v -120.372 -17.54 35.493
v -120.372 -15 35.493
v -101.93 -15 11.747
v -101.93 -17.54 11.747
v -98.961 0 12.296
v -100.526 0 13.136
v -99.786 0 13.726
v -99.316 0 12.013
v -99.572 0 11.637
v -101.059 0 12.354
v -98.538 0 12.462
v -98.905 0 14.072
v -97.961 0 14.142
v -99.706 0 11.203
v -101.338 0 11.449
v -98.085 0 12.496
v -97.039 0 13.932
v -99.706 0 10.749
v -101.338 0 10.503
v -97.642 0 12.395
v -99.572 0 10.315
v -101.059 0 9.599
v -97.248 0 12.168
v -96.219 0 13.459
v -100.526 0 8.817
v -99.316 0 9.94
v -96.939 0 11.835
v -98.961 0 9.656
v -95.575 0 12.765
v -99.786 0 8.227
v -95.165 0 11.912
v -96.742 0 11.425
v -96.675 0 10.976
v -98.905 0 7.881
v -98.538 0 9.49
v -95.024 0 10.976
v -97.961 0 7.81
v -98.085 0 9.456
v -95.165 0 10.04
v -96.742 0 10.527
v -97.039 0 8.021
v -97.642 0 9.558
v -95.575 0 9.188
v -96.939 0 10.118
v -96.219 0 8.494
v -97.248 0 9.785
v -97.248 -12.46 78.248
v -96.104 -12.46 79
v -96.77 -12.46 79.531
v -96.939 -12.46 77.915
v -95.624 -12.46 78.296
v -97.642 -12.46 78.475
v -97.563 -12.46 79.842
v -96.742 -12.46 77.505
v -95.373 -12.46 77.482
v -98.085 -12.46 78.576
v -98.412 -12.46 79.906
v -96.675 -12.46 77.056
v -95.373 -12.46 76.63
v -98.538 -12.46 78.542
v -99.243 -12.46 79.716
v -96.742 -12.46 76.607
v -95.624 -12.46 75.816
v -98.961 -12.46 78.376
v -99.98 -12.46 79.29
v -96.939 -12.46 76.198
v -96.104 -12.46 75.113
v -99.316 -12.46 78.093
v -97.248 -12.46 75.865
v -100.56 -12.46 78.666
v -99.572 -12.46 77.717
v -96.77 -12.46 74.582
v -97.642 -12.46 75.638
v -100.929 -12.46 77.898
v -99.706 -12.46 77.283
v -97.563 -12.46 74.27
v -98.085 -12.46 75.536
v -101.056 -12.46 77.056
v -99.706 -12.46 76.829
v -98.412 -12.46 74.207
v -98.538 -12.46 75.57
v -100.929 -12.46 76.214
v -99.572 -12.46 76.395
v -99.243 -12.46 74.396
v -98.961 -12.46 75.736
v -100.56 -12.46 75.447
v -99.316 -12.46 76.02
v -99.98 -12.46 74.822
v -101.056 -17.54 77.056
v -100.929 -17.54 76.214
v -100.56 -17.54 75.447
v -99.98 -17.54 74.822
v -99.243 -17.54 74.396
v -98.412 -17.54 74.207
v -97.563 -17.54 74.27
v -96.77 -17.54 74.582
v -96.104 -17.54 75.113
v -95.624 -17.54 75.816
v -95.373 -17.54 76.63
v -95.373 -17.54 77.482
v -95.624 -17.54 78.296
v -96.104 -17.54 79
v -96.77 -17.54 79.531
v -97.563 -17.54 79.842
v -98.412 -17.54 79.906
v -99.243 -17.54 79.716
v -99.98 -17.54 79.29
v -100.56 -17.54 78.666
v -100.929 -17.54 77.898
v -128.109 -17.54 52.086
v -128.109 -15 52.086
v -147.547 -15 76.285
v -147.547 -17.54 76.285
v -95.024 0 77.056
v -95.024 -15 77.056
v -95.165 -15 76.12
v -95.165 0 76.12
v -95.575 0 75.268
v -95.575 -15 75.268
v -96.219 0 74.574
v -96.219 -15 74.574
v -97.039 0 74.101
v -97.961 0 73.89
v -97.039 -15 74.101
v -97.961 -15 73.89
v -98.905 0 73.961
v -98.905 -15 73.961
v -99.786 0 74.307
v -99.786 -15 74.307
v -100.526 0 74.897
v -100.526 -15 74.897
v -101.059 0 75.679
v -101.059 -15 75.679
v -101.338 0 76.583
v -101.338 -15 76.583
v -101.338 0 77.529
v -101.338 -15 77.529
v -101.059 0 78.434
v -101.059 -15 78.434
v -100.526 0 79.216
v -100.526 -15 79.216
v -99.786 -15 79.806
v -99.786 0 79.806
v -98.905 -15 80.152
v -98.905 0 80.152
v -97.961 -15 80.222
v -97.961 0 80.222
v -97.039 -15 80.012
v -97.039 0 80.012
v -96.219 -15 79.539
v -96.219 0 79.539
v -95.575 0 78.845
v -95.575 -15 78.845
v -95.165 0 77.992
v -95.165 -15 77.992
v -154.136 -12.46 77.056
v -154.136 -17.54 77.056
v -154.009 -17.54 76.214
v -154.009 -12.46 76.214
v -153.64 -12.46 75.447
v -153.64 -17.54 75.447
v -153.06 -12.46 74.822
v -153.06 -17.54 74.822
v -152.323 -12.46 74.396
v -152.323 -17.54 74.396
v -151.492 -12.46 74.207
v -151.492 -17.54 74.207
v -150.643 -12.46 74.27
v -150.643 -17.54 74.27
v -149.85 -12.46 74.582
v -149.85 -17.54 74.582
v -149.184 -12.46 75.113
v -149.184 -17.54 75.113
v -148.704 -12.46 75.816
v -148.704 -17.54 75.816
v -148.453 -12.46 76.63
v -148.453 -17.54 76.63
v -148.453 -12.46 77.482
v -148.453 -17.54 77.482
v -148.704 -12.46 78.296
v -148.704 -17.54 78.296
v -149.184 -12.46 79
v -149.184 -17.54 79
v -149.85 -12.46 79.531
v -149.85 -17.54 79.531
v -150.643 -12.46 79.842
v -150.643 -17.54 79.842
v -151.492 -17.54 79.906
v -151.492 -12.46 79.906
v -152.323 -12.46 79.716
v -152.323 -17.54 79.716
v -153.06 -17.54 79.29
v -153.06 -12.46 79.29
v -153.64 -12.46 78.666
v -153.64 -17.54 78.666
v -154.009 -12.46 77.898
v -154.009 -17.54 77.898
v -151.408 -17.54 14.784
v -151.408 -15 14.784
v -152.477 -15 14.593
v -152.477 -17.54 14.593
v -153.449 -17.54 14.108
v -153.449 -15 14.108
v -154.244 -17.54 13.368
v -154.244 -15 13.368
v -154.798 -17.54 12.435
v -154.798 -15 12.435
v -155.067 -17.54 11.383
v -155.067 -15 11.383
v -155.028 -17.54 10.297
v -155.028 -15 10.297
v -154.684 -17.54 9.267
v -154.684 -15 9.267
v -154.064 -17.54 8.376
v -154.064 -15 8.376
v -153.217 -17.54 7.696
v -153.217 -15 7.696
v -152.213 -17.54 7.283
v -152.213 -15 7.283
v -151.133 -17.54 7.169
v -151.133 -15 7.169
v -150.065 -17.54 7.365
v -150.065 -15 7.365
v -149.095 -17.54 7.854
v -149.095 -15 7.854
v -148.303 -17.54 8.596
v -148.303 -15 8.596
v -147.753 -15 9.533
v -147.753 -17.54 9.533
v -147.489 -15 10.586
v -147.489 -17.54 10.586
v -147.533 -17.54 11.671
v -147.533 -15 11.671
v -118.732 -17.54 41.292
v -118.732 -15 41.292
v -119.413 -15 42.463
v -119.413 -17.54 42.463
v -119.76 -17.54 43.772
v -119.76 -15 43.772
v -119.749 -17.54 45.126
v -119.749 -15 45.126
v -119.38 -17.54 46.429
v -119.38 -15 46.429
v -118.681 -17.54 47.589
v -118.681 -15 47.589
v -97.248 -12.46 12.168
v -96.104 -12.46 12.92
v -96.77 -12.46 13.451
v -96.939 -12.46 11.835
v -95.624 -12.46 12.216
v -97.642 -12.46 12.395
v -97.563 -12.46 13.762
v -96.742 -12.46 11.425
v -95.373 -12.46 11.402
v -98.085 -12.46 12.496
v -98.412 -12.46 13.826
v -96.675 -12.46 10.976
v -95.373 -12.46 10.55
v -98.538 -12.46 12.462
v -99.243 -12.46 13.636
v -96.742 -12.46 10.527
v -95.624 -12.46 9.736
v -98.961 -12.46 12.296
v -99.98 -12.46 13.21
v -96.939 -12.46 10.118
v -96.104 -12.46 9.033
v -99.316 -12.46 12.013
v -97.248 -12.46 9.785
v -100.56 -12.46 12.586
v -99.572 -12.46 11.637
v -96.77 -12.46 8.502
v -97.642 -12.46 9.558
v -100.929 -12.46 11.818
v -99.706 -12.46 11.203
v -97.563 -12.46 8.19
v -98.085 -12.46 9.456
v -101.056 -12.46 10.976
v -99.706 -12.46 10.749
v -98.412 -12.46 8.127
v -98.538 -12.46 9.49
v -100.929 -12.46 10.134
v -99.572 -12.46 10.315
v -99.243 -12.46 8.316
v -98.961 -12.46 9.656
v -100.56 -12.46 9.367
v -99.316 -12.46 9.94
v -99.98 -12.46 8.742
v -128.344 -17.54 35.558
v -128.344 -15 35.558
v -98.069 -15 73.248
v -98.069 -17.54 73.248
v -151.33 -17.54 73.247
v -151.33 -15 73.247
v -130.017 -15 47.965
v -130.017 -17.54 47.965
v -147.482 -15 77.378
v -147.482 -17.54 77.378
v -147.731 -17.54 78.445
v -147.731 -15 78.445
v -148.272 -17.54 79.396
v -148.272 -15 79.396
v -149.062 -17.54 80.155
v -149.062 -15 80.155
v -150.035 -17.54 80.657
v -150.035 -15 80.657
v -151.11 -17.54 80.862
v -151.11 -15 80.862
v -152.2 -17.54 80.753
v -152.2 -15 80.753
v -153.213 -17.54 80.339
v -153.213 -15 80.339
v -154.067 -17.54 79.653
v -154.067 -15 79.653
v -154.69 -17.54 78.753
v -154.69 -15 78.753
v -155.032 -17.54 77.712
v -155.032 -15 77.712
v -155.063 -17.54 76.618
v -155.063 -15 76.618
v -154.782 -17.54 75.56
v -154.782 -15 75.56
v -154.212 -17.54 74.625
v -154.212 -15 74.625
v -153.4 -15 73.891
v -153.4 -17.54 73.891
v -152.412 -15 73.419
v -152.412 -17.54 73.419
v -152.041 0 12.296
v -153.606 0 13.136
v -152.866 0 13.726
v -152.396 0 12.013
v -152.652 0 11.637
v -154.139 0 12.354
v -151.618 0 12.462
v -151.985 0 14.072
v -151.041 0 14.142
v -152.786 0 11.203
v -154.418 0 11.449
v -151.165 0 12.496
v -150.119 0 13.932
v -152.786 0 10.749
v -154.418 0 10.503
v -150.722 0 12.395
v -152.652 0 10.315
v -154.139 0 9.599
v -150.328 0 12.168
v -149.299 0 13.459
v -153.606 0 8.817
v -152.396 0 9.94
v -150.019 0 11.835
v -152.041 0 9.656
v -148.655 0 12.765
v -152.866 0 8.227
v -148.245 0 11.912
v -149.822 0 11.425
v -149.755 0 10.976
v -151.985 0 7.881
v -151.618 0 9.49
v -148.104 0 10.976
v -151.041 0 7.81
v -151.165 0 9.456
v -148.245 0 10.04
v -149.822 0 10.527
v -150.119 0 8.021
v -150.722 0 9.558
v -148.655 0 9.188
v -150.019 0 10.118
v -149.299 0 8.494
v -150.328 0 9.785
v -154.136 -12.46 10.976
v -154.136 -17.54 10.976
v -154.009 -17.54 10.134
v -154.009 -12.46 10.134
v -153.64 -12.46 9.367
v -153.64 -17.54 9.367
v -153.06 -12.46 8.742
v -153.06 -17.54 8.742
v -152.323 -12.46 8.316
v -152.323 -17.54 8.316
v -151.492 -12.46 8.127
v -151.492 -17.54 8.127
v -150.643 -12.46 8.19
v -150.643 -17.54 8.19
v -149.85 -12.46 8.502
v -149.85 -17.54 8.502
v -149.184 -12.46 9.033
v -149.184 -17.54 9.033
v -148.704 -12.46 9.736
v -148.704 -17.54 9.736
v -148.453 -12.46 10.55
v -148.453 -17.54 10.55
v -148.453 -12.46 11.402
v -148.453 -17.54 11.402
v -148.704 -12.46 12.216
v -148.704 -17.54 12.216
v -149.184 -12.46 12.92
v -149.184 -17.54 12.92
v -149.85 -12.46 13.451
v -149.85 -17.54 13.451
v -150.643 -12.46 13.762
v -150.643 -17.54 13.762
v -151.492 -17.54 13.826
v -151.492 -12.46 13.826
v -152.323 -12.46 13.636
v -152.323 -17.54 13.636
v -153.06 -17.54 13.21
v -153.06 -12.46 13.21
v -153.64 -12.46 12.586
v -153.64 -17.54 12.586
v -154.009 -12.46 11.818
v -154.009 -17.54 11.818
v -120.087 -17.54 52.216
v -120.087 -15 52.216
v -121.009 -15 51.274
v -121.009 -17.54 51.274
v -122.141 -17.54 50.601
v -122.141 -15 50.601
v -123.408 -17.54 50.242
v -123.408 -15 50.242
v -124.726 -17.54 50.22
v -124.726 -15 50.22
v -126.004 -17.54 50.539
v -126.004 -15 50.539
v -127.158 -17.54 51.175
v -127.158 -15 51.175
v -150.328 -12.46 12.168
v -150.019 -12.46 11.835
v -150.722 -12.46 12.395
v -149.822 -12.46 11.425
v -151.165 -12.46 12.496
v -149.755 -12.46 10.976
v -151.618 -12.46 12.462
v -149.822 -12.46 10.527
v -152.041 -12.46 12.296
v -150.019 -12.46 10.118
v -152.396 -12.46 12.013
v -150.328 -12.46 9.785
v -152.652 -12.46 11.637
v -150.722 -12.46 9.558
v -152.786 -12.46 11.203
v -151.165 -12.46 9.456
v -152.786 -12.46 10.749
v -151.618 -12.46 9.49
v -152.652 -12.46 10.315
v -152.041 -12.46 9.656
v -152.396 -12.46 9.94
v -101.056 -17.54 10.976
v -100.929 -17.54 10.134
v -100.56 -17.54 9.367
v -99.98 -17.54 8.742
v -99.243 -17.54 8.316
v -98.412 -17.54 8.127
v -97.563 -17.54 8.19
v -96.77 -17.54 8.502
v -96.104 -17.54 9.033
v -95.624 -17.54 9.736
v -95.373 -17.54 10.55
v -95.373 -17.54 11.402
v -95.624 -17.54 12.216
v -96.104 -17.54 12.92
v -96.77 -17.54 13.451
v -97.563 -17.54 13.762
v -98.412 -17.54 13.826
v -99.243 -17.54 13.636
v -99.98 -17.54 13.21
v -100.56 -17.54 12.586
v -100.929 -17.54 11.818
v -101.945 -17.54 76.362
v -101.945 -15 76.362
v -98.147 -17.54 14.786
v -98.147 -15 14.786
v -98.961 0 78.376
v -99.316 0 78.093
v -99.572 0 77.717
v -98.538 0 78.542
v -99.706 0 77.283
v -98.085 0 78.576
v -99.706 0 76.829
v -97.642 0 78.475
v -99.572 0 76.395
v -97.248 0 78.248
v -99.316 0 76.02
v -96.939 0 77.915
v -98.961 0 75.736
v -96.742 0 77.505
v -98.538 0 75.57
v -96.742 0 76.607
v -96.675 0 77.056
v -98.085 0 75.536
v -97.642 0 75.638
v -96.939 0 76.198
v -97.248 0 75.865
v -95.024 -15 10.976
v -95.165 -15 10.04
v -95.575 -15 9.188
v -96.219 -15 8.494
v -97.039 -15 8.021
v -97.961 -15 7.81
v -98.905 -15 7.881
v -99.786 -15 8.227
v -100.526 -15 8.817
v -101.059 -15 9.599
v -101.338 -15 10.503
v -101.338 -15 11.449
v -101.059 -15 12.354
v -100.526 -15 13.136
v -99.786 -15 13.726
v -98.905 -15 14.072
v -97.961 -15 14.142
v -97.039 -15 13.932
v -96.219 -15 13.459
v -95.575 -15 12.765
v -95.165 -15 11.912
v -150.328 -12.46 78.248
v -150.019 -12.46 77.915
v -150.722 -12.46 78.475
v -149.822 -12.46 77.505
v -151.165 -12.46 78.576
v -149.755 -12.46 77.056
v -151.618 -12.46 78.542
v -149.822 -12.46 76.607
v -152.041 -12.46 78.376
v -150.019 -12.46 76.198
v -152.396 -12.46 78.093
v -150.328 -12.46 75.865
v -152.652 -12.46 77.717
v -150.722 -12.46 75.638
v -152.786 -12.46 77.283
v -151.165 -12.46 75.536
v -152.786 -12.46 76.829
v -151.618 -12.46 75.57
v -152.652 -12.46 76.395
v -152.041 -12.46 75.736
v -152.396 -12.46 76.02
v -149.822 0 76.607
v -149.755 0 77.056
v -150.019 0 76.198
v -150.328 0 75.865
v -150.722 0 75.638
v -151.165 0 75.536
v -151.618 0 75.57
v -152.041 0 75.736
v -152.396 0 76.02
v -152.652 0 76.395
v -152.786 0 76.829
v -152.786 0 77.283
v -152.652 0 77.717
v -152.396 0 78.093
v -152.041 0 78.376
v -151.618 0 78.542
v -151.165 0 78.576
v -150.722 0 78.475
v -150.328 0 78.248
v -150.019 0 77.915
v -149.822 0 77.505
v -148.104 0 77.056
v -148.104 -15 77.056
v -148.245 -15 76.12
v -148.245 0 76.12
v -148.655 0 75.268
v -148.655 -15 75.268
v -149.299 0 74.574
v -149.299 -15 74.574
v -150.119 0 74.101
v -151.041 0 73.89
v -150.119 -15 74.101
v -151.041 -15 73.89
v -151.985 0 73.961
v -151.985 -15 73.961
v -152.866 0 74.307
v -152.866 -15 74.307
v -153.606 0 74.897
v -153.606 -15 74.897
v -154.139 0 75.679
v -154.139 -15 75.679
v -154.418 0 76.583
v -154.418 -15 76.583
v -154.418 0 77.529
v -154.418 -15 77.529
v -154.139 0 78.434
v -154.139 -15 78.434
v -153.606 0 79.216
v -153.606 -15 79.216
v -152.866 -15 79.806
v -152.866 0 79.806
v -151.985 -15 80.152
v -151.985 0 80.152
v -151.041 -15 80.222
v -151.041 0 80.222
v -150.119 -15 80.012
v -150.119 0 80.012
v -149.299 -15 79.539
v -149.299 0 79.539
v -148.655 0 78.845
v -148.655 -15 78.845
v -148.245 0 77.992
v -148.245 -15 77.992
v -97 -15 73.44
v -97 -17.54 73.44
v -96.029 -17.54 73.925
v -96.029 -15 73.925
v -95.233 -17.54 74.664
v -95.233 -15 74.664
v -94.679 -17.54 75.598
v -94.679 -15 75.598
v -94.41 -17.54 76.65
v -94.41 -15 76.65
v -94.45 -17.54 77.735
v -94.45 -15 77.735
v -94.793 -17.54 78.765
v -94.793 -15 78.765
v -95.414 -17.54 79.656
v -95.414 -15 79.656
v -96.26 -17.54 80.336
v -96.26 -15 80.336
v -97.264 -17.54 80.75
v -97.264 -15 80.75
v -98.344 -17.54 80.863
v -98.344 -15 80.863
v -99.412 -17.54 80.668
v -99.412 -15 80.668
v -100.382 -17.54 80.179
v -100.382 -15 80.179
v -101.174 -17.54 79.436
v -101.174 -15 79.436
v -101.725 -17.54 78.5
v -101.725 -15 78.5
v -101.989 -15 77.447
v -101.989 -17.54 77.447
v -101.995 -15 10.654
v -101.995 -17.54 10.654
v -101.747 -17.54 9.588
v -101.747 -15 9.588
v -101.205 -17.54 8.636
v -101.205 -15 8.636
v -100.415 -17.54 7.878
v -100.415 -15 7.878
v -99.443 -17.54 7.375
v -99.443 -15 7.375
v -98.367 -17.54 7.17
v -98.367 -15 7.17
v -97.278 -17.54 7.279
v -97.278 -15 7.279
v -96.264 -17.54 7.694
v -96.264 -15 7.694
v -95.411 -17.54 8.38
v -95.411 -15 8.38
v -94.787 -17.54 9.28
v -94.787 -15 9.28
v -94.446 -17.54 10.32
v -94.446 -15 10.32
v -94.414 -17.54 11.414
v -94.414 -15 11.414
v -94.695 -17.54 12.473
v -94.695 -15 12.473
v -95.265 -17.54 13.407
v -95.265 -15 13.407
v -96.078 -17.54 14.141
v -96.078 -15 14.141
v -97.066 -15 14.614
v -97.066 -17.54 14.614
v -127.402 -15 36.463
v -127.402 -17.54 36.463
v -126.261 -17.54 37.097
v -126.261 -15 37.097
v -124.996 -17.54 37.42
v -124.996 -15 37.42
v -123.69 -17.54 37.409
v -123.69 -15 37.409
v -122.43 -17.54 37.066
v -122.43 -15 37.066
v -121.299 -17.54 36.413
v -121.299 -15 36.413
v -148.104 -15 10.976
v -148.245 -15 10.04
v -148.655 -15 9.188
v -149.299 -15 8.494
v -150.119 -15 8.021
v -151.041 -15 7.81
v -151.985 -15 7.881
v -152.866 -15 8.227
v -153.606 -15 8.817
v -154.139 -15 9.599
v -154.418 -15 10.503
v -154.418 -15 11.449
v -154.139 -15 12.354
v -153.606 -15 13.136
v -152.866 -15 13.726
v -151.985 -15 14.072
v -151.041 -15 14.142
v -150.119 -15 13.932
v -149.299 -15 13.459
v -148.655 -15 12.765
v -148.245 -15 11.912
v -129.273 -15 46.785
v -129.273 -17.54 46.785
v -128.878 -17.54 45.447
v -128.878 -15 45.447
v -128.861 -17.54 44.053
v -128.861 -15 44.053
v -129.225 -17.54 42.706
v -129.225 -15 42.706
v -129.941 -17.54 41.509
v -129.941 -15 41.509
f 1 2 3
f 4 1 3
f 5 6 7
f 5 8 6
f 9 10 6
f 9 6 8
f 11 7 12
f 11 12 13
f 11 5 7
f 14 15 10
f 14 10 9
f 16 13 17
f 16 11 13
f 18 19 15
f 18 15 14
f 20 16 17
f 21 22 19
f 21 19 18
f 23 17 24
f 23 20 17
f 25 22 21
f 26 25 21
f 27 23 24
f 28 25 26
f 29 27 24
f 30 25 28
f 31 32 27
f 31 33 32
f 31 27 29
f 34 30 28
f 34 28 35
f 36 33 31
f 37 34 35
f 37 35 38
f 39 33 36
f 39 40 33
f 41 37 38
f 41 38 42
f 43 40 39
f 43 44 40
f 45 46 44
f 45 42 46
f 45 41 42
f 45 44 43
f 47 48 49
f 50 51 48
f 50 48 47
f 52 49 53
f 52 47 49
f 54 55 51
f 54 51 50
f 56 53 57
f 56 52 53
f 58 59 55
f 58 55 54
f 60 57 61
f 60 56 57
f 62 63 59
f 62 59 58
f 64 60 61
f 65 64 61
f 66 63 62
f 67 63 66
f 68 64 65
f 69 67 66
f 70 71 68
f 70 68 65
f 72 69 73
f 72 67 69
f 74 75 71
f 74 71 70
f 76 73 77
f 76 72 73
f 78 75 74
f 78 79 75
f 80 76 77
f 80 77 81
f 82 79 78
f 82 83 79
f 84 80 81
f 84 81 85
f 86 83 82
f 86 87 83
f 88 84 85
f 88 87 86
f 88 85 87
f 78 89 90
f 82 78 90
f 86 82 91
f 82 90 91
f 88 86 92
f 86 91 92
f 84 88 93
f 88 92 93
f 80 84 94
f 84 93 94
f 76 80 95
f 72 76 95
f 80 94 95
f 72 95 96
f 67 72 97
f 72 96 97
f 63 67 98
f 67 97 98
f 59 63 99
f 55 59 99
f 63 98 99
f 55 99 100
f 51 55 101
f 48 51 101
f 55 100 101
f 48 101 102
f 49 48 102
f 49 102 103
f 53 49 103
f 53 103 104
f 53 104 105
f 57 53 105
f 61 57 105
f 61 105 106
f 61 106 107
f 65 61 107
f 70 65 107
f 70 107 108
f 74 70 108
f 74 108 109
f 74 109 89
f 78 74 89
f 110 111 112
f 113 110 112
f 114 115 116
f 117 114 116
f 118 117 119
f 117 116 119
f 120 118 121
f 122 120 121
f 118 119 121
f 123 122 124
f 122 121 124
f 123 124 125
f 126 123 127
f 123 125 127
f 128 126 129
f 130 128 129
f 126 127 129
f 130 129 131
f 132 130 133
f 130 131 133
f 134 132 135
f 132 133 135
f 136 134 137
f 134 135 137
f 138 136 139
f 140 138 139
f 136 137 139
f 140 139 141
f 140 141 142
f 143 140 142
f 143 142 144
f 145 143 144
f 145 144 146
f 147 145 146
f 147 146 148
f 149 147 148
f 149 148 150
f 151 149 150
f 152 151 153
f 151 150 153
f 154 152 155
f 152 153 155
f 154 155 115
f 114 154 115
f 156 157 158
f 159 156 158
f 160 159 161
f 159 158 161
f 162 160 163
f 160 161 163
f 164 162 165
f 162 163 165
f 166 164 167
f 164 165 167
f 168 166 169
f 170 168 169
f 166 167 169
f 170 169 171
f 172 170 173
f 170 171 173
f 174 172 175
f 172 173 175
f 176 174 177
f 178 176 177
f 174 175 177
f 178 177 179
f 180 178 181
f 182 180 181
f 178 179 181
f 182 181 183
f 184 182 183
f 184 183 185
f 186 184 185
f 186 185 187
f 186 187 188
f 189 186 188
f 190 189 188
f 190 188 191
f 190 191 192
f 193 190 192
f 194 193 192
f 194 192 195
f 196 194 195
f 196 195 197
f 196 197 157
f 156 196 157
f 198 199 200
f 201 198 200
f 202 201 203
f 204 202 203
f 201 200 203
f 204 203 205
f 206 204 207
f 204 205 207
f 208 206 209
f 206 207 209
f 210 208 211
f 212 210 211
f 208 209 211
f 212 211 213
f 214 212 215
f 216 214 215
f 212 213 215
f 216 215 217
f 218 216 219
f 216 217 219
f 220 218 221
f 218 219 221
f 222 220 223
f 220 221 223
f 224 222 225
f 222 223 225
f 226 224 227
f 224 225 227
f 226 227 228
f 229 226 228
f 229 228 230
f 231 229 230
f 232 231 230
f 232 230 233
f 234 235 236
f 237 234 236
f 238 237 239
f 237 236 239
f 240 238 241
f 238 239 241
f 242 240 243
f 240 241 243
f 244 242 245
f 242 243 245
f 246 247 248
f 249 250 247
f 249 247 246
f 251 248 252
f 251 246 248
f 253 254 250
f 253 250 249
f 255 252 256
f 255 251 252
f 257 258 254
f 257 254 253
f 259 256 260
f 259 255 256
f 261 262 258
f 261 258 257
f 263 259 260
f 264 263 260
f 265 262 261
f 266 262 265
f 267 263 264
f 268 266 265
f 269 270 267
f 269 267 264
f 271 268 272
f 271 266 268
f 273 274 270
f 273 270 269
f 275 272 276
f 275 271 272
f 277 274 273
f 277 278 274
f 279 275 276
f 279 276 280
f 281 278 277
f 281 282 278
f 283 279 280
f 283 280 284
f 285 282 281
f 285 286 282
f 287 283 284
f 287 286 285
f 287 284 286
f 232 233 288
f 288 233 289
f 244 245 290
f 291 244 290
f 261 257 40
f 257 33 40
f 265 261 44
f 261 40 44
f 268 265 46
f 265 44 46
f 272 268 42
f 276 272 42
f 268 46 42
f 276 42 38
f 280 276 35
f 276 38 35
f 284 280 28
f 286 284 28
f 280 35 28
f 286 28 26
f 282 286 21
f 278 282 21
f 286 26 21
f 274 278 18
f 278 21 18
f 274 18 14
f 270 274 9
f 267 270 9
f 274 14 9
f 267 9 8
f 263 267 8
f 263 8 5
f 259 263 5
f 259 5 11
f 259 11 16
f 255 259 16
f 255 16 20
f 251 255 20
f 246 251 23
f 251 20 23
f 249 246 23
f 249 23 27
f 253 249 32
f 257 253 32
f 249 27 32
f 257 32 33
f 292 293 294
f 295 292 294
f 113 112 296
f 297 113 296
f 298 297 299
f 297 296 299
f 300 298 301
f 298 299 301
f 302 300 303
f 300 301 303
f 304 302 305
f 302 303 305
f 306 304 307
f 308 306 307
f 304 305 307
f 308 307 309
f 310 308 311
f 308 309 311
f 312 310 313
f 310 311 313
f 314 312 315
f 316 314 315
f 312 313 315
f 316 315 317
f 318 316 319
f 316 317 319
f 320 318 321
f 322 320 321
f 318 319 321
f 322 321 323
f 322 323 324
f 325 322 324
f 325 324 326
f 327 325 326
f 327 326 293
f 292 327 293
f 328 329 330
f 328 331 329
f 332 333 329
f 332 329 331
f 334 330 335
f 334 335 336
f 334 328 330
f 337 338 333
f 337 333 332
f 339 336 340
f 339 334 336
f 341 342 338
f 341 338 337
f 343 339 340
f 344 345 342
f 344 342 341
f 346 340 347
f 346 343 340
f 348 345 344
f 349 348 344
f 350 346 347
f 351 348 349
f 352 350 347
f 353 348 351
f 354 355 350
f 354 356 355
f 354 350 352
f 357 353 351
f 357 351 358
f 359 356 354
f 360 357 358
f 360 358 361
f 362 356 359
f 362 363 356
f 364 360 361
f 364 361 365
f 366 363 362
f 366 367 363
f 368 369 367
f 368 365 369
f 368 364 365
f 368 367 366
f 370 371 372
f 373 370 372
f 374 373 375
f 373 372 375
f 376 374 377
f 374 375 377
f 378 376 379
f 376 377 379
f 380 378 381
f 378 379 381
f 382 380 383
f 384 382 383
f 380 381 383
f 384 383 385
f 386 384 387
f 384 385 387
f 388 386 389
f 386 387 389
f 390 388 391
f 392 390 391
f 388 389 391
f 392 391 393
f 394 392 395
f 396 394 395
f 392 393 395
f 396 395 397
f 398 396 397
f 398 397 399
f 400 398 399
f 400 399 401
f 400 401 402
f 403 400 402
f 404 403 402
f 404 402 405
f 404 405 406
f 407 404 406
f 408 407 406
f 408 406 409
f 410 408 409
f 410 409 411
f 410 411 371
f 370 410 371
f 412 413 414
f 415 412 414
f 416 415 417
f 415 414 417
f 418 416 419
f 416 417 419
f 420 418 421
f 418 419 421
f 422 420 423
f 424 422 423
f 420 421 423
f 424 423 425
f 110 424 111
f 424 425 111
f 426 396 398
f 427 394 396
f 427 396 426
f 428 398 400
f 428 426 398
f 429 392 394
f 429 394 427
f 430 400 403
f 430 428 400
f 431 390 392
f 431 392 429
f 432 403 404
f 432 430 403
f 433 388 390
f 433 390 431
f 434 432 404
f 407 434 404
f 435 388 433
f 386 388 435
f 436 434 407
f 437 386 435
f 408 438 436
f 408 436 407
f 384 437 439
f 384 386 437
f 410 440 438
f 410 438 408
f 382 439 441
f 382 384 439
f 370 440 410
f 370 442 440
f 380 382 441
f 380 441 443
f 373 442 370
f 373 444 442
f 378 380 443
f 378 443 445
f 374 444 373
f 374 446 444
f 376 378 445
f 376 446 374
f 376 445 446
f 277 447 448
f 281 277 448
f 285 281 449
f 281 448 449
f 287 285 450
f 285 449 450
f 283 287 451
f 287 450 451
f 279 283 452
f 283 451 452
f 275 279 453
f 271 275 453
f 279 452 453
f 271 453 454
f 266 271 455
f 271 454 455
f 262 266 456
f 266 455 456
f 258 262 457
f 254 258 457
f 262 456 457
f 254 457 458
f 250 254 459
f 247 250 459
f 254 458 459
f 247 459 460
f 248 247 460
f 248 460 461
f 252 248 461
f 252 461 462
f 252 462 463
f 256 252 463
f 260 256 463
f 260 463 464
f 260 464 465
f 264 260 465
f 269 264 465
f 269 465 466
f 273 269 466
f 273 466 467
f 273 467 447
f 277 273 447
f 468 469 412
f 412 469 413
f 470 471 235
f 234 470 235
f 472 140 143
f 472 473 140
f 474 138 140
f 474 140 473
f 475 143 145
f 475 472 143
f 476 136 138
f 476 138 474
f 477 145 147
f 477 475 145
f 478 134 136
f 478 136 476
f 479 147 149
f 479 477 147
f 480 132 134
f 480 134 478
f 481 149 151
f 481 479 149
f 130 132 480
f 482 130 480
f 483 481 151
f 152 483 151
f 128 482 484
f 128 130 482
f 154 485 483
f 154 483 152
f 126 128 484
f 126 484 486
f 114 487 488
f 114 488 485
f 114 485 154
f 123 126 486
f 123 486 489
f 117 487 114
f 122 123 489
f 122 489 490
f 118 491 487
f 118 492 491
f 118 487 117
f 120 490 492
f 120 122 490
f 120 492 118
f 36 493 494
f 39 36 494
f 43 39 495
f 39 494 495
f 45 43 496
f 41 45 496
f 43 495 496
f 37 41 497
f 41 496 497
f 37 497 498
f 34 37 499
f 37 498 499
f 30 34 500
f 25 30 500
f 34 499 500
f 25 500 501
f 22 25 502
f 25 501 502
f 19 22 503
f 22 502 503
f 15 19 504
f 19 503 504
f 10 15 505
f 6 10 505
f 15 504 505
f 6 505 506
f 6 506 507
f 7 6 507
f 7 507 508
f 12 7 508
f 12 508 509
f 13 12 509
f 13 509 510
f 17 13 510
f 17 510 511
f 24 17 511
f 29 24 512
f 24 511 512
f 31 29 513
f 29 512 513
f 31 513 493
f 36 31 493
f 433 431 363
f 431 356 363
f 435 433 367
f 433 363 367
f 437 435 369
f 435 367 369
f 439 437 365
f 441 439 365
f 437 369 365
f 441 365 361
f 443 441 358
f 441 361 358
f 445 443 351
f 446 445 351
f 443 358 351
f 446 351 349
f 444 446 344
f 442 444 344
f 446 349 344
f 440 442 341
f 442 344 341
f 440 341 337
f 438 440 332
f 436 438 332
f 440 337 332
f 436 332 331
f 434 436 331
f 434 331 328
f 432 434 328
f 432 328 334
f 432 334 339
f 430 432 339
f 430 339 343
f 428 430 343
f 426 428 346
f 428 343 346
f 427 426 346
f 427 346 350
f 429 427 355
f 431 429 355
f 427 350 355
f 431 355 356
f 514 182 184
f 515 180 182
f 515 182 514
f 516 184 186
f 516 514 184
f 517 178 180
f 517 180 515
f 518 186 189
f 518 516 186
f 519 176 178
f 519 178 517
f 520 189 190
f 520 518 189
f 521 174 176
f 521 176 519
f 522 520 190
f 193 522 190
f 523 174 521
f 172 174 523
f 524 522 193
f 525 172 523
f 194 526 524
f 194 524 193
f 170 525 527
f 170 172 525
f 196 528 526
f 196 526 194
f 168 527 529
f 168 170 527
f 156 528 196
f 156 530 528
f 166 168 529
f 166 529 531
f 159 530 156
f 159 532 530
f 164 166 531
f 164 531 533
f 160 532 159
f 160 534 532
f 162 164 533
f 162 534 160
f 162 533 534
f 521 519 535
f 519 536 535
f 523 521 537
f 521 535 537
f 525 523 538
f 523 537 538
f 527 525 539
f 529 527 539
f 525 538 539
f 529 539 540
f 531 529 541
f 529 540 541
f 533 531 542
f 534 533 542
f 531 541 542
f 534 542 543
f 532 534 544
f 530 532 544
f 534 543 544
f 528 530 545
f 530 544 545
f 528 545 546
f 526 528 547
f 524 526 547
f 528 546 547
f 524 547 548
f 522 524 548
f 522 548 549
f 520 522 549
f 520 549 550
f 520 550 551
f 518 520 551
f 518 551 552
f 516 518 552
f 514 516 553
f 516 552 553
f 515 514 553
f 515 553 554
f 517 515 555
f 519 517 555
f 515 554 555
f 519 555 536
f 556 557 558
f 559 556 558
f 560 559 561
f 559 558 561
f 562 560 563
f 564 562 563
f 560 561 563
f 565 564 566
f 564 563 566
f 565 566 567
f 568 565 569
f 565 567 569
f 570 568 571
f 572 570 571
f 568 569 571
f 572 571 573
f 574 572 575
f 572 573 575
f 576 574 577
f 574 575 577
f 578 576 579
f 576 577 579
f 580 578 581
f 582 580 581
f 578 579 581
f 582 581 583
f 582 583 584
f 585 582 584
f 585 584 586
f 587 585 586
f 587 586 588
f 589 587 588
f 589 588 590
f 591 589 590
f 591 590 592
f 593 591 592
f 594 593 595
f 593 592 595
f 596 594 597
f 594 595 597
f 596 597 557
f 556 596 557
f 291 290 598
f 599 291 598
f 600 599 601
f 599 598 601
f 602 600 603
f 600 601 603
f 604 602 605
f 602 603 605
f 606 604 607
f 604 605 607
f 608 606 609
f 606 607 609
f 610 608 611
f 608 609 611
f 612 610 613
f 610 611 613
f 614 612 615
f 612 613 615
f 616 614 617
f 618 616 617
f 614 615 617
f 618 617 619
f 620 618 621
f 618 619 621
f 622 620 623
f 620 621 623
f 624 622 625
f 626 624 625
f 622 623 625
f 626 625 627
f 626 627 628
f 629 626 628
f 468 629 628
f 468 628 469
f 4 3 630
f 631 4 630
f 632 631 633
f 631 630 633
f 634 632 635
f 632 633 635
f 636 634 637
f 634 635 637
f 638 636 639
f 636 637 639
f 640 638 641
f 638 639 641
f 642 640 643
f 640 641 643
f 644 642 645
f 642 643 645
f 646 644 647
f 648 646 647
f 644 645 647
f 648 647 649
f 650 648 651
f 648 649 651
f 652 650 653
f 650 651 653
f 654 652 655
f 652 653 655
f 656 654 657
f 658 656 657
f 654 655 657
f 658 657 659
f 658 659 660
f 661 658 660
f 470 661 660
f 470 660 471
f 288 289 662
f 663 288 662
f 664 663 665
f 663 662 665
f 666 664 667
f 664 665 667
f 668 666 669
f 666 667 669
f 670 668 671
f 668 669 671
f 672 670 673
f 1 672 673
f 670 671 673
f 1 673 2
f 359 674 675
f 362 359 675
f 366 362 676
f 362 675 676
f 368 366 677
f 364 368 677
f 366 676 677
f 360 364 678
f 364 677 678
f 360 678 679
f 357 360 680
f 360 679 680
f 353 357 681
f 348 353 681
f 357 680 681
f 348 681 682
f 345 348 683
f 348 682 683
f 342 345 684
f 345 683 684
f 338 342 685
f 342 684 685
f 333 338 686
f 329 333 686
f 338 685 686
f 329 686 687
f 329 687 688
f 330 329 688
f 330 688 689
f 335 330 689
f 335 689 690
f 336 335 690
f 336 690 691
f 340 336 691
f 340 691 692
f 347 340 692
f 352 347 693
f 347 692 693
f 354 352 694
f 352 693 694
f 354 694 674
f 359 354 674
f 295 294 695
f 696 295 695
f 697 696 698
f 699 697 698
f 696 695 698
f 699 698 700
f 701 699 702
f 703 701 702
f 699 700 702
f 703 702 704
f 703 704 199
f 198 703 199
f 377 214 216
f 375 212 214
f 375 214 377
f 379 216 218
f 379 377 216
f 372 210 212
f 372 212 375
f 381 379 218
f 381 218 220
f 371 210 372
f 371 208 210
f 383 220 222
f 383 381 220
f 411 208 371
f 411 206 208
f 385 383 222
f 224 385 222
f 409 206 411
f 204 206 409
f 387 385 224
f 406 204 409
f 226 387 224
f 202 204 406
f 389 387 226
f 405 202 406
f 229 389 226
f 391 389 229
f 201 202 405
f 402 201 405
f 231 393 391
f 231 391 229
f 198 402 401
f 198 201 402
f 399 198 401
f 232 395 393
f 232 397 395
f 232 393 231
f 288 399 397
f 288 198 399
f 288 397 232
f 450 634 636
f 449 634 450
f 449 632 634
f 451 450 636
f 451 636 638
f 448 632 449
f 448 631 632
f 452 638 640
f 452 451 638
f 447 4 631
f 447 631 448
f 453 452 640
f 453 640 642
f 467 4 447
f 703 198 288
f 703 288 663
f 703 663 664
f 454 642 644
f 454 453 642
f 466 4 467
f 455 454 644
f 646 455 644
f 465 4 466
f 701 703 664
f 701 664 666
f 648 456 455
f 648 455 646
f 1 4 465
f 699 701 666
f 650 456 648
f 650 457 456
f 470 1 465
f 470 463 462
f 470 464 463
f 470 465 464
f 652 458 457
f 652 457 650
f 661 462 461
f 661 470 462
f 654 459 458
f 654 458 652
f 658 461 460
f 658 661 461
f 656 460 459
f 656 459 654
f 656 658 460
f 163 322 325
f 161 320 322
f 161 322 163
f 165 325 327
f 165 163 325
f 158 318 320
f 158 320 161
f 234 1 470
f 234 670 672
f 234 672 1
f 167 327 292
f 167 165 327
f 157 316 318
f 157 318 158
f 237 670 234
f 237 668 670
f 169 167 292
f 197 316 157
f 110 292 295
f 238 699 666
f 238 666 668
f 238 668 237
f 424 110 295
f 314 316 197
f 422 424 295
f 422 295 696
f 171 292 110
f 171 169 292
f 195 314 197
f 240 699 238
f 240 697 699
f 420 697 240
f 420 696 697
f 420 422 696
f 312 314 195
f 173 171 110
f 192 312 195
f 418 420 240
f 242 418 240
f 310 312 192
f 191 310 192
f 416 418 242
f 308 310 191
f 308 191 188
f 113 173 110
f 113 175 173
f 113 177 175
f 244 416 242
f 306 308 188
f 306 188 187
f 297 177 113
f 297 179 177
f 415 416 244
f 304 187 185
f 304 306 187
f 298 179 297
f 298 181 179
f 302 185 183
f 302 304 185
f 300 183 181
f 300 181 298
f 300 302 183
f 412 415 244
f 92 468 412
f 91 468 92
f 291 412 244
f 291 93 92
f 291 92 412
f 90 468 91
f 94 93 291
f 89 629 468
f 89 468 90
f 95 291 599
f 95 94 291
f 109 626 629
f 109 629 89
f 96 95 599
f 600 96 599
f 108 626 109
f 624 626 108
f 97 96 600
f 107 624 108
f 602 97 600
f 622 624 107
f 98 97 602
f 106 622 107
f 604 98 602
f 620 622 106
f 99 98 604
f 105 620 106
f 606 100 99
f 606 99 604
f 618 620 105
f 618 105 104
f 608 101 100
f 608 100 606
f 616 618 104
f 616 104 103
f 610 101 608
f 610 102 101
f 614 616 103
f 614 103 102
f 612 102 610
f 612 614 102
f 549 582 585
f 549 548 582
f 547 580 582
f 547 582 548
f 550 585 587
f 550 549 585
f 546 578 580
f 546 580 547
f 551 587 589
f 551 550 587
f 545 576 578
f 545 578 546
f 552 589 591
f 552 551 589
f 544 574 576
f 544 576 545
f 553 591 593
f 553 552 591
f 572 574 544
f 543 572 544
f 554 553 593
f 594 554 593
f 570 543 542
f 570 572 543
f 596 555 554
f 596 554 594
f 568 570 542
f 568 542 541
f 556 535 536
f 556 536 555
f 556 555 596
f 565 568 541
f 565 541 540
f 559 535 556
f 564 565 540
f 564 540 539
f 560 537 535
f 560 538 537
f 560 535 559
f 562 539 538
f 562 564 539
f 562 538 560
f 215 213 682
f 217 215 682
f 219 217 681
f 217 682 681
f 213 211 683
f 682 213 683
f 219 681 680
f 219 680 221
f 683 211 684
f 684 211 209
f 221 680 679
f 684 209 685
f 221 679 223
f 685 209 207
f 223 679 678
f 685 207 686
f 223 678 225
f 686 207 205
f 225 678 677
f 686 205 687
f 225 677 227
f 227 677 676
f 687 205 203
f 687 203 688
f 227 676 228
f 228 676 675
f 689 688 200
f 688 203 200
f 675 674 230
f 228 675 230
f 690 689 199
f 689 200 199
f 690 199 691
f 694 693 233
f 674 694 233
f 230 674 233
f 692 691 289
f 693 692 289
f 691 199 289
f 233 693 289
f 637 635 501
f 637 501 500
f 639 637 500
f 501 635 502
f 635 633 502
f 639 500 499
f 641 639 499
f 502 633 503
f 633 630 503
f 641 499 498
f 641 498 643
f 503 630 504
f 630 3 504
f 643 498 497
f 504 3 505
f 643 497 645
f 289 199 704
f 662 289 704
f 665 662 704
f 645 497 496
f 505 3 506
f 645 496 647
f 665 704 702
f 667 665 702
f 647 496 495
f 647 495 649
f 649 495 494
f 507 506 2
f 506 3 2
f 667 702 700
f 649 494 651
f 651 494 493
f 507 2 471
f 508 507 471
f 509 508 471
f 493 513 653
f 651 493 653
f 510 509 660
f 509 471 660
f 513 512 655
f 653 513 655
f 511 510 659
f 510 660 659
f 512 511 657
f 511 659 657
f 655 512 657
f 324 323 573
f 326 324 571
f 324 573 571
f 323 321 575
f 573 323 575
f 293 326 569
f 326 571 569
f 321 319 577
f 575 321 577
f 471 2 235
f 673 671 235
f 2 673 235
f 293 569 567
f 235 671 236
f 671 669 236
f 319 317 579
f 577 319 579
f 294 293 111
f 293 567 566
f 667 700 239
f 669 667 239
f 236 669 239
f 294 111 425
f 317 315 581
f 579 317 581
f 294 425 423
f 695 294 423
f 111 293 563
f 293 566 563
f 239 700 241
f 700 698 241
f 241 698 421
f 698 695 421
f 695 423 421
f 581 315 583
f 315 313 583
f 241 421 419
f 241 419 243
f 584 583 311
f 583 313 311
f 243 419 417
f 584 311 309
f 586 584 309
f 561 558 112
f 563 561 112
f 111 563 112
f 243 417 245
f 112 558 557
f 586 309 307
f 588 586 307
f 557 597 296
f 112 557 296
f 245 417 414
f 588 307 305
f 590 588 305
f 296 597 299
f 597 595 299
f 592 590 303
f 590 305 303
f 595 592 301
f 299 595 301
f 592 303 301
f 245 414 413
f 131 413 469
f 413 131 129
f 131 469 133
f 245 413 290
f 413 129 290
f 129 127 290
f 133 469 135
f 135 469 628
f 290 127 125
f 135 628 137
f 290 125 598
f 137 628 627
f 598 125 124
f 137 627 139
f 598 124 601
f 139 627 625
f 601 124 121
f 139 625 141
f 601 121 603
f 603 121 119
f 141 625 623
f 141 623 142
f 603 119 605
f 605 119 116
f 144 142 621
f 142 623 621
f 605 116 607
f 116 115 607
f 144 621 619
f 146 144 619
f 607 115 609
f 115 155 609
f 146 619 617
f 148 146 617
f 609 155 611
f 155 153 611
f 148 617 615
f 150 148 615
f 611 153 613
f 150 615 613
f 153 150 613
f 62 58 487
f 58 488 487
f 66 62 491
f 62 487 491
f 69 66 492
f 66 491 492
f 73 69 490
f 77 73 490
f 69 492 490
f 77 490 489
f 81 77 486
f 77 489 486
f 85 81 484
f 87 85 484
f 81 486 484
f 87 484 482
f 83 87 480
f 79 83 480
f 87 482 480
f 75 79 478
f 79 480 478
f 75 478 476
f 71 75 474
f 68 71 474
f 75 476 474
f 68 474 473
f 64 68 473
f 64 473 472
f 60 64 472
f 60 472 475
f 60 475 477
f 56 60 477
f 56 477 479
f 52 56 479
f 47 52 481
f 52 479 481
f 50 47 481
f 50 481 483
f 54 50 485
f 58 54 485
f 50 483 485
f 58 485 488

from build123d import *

# Parameters (mm, degrees)
BOSS_EXTRUDE1_DEPTH                                 = 2.54
SKETCH2_R                                           = 3.175
BOSS_EXTRUDE2_DEPTH                                 = 15
CBORE_FOR_00_BINDING_HEAD_MACHINE_SCREW_D           = 3.048
CBORE_FOR_00_BINDING_HEAD_MACHINE_SCREW_CBORE_D     = 5.715
CBORE_FOR_00_BINDING_HEAD_MACHINE_SCREW_CBORE_DEPTH = 5.08
CBORE_FOR_00_BINDING_HEAD_MACHINE_S_2_D             = 3.048
CBORE_FOR_00_BINDING_HEAD_MACHINE_S_2_CBORE_D       = 5.715
CBORE_FOR_00_BINDING_HEAD_MACHINE_S_2_CBORE_DEPTH   = 5.08


with BuildPart() as part:
    # Sketch1 → Boss-Extrude1 (new body)
    with BuildSketch(Plane.XZ.offset(14.999999665)):
        with BuildLine():
            ThreePointArc((-118.732237126, 41.291635073), (-119.799942246, 44.449254661), (-118.68060362, 47.588942022))
            Line((-118.68060362, 47.588942022), (-98.069142774, 73.248424617))
            ThreePointArc((-98.069142774, 73.248424617), (-95.812668617, 80.026590118), (-101.944824249, 76.361638481))
            Line((-101.944824249, 76.361638481), (-120.087244283, 52.215986296))
            ThreePointArc((-120.087244283, 52.215986296), (-124.066396106, 50.188221558), (-128.109054429, 52.086218591))
            Line((-128.109054429, 52.086218591), (-147.547470085, 76.285361579))
            ThreePointArc((-147.547470085, 76.285361579), (-153.664676639, 80.026590118), (-151.33049651, 73.246574622))
            Line((-151.33049651, 73.246574622), (-130.017313744, 47.964682708))
            ThreePointArc((-130.017313744, 47.964682708), (-128.821664975, 44.750582309), (-129.940817748, 41.509052665))
            Line((-129.940817748, 41.509052665), (-151.408202483, 14.784019002))
            ThreePointArc((-151.408202483, 14.784019002), (-153.664676639, 8.0058535), (-147.532521008, 11.670805138))
            Line((-147.532521008, 11.670805138), (-128.34443149, 35.558313777))
            ThreePointArc((-128.34443149, 35.558313777), (-124.342289826, 37.456804622), (-120.37181674, 35.49294392))
            Line((-120.37181674, 35.49294392), (-101.929875172, 11.74708204))
            ThreePointArc((-101.929875172, 11.74708204), (-95.812668617, 8.0058535), (-98.146848747, 14.785868997))
            Line((-98.146848747, 14.785868997), (-118.732237126, 41.291635073))
        make_face()
    extrude(amount=BOSS_EXTRUDE1_DEPTH)

    # Sketch2 → Boss-Extrude2 (add)
    with BuildSketch(Plane(origin=(0, -14.999999665, 0), x_dir=(1, 0, 0), z_dir=(0, 1, 0))):
        with Locations((-98.19867242, -10.976221467)):
            Circle(SKETCH2_R)
        with Locations((-151.278672837, -10.976221467)):
            Circle(SKETCH2_R)
        with Locations((-151.278672837, -77.056222152)):
            Circle(SKETCH2_R)
        with Locations((-98.19867242, -77.056222152)):
            Circle(SKETCH2_R)
    extrude(amount=BOSS_EXTRUDE2_DEPTH)

    # CBORE for _00 Binding Head Machine Screw (through all)
    with Locations(Plane(origin=(0, -17.539999665, 0), x_dir=(-1, 0, 0), z_dir=(0, -1, 0))):
        with Locations((151.278672837, -10.976221467)):
            CounterBoreHole(CBORE_FOR_00_BINDING_HEAD_MACHINE_SCREW_D / 2, CBORE_FOR_00_BINDING_HEAD_MACHINE_SCREW_CBORE_D / 2, CBORE_FOR_00_BINDING_HEAD_MACHINE_SCREW_CBORE_DEPTH)

    # CBORE for _00 Binding Head Machine S 2 (through all)
    with Locations(Plane(origin=(0, -17.539999665, 0), x_dir=(-1, 0, 0), z_dir=(0, -1, 0))):
        with Locations((98.19867242, -10.976221467), (98.19867242, -77.056222152), (151.278672837, -77.056222152)):
            CounterBoreHole(CBORE_FOR_00_BINDING_HEAD_MACHINE_S_2_D / 2, CBORE_FOR_00_BINDING_HEAD_MACHINE_S_2_CBORE_D / 2, CBORE_FOR_00_BINDING_HEAD_MACHINE_S_2_CBORE_DEPTH)


solid = part.part
